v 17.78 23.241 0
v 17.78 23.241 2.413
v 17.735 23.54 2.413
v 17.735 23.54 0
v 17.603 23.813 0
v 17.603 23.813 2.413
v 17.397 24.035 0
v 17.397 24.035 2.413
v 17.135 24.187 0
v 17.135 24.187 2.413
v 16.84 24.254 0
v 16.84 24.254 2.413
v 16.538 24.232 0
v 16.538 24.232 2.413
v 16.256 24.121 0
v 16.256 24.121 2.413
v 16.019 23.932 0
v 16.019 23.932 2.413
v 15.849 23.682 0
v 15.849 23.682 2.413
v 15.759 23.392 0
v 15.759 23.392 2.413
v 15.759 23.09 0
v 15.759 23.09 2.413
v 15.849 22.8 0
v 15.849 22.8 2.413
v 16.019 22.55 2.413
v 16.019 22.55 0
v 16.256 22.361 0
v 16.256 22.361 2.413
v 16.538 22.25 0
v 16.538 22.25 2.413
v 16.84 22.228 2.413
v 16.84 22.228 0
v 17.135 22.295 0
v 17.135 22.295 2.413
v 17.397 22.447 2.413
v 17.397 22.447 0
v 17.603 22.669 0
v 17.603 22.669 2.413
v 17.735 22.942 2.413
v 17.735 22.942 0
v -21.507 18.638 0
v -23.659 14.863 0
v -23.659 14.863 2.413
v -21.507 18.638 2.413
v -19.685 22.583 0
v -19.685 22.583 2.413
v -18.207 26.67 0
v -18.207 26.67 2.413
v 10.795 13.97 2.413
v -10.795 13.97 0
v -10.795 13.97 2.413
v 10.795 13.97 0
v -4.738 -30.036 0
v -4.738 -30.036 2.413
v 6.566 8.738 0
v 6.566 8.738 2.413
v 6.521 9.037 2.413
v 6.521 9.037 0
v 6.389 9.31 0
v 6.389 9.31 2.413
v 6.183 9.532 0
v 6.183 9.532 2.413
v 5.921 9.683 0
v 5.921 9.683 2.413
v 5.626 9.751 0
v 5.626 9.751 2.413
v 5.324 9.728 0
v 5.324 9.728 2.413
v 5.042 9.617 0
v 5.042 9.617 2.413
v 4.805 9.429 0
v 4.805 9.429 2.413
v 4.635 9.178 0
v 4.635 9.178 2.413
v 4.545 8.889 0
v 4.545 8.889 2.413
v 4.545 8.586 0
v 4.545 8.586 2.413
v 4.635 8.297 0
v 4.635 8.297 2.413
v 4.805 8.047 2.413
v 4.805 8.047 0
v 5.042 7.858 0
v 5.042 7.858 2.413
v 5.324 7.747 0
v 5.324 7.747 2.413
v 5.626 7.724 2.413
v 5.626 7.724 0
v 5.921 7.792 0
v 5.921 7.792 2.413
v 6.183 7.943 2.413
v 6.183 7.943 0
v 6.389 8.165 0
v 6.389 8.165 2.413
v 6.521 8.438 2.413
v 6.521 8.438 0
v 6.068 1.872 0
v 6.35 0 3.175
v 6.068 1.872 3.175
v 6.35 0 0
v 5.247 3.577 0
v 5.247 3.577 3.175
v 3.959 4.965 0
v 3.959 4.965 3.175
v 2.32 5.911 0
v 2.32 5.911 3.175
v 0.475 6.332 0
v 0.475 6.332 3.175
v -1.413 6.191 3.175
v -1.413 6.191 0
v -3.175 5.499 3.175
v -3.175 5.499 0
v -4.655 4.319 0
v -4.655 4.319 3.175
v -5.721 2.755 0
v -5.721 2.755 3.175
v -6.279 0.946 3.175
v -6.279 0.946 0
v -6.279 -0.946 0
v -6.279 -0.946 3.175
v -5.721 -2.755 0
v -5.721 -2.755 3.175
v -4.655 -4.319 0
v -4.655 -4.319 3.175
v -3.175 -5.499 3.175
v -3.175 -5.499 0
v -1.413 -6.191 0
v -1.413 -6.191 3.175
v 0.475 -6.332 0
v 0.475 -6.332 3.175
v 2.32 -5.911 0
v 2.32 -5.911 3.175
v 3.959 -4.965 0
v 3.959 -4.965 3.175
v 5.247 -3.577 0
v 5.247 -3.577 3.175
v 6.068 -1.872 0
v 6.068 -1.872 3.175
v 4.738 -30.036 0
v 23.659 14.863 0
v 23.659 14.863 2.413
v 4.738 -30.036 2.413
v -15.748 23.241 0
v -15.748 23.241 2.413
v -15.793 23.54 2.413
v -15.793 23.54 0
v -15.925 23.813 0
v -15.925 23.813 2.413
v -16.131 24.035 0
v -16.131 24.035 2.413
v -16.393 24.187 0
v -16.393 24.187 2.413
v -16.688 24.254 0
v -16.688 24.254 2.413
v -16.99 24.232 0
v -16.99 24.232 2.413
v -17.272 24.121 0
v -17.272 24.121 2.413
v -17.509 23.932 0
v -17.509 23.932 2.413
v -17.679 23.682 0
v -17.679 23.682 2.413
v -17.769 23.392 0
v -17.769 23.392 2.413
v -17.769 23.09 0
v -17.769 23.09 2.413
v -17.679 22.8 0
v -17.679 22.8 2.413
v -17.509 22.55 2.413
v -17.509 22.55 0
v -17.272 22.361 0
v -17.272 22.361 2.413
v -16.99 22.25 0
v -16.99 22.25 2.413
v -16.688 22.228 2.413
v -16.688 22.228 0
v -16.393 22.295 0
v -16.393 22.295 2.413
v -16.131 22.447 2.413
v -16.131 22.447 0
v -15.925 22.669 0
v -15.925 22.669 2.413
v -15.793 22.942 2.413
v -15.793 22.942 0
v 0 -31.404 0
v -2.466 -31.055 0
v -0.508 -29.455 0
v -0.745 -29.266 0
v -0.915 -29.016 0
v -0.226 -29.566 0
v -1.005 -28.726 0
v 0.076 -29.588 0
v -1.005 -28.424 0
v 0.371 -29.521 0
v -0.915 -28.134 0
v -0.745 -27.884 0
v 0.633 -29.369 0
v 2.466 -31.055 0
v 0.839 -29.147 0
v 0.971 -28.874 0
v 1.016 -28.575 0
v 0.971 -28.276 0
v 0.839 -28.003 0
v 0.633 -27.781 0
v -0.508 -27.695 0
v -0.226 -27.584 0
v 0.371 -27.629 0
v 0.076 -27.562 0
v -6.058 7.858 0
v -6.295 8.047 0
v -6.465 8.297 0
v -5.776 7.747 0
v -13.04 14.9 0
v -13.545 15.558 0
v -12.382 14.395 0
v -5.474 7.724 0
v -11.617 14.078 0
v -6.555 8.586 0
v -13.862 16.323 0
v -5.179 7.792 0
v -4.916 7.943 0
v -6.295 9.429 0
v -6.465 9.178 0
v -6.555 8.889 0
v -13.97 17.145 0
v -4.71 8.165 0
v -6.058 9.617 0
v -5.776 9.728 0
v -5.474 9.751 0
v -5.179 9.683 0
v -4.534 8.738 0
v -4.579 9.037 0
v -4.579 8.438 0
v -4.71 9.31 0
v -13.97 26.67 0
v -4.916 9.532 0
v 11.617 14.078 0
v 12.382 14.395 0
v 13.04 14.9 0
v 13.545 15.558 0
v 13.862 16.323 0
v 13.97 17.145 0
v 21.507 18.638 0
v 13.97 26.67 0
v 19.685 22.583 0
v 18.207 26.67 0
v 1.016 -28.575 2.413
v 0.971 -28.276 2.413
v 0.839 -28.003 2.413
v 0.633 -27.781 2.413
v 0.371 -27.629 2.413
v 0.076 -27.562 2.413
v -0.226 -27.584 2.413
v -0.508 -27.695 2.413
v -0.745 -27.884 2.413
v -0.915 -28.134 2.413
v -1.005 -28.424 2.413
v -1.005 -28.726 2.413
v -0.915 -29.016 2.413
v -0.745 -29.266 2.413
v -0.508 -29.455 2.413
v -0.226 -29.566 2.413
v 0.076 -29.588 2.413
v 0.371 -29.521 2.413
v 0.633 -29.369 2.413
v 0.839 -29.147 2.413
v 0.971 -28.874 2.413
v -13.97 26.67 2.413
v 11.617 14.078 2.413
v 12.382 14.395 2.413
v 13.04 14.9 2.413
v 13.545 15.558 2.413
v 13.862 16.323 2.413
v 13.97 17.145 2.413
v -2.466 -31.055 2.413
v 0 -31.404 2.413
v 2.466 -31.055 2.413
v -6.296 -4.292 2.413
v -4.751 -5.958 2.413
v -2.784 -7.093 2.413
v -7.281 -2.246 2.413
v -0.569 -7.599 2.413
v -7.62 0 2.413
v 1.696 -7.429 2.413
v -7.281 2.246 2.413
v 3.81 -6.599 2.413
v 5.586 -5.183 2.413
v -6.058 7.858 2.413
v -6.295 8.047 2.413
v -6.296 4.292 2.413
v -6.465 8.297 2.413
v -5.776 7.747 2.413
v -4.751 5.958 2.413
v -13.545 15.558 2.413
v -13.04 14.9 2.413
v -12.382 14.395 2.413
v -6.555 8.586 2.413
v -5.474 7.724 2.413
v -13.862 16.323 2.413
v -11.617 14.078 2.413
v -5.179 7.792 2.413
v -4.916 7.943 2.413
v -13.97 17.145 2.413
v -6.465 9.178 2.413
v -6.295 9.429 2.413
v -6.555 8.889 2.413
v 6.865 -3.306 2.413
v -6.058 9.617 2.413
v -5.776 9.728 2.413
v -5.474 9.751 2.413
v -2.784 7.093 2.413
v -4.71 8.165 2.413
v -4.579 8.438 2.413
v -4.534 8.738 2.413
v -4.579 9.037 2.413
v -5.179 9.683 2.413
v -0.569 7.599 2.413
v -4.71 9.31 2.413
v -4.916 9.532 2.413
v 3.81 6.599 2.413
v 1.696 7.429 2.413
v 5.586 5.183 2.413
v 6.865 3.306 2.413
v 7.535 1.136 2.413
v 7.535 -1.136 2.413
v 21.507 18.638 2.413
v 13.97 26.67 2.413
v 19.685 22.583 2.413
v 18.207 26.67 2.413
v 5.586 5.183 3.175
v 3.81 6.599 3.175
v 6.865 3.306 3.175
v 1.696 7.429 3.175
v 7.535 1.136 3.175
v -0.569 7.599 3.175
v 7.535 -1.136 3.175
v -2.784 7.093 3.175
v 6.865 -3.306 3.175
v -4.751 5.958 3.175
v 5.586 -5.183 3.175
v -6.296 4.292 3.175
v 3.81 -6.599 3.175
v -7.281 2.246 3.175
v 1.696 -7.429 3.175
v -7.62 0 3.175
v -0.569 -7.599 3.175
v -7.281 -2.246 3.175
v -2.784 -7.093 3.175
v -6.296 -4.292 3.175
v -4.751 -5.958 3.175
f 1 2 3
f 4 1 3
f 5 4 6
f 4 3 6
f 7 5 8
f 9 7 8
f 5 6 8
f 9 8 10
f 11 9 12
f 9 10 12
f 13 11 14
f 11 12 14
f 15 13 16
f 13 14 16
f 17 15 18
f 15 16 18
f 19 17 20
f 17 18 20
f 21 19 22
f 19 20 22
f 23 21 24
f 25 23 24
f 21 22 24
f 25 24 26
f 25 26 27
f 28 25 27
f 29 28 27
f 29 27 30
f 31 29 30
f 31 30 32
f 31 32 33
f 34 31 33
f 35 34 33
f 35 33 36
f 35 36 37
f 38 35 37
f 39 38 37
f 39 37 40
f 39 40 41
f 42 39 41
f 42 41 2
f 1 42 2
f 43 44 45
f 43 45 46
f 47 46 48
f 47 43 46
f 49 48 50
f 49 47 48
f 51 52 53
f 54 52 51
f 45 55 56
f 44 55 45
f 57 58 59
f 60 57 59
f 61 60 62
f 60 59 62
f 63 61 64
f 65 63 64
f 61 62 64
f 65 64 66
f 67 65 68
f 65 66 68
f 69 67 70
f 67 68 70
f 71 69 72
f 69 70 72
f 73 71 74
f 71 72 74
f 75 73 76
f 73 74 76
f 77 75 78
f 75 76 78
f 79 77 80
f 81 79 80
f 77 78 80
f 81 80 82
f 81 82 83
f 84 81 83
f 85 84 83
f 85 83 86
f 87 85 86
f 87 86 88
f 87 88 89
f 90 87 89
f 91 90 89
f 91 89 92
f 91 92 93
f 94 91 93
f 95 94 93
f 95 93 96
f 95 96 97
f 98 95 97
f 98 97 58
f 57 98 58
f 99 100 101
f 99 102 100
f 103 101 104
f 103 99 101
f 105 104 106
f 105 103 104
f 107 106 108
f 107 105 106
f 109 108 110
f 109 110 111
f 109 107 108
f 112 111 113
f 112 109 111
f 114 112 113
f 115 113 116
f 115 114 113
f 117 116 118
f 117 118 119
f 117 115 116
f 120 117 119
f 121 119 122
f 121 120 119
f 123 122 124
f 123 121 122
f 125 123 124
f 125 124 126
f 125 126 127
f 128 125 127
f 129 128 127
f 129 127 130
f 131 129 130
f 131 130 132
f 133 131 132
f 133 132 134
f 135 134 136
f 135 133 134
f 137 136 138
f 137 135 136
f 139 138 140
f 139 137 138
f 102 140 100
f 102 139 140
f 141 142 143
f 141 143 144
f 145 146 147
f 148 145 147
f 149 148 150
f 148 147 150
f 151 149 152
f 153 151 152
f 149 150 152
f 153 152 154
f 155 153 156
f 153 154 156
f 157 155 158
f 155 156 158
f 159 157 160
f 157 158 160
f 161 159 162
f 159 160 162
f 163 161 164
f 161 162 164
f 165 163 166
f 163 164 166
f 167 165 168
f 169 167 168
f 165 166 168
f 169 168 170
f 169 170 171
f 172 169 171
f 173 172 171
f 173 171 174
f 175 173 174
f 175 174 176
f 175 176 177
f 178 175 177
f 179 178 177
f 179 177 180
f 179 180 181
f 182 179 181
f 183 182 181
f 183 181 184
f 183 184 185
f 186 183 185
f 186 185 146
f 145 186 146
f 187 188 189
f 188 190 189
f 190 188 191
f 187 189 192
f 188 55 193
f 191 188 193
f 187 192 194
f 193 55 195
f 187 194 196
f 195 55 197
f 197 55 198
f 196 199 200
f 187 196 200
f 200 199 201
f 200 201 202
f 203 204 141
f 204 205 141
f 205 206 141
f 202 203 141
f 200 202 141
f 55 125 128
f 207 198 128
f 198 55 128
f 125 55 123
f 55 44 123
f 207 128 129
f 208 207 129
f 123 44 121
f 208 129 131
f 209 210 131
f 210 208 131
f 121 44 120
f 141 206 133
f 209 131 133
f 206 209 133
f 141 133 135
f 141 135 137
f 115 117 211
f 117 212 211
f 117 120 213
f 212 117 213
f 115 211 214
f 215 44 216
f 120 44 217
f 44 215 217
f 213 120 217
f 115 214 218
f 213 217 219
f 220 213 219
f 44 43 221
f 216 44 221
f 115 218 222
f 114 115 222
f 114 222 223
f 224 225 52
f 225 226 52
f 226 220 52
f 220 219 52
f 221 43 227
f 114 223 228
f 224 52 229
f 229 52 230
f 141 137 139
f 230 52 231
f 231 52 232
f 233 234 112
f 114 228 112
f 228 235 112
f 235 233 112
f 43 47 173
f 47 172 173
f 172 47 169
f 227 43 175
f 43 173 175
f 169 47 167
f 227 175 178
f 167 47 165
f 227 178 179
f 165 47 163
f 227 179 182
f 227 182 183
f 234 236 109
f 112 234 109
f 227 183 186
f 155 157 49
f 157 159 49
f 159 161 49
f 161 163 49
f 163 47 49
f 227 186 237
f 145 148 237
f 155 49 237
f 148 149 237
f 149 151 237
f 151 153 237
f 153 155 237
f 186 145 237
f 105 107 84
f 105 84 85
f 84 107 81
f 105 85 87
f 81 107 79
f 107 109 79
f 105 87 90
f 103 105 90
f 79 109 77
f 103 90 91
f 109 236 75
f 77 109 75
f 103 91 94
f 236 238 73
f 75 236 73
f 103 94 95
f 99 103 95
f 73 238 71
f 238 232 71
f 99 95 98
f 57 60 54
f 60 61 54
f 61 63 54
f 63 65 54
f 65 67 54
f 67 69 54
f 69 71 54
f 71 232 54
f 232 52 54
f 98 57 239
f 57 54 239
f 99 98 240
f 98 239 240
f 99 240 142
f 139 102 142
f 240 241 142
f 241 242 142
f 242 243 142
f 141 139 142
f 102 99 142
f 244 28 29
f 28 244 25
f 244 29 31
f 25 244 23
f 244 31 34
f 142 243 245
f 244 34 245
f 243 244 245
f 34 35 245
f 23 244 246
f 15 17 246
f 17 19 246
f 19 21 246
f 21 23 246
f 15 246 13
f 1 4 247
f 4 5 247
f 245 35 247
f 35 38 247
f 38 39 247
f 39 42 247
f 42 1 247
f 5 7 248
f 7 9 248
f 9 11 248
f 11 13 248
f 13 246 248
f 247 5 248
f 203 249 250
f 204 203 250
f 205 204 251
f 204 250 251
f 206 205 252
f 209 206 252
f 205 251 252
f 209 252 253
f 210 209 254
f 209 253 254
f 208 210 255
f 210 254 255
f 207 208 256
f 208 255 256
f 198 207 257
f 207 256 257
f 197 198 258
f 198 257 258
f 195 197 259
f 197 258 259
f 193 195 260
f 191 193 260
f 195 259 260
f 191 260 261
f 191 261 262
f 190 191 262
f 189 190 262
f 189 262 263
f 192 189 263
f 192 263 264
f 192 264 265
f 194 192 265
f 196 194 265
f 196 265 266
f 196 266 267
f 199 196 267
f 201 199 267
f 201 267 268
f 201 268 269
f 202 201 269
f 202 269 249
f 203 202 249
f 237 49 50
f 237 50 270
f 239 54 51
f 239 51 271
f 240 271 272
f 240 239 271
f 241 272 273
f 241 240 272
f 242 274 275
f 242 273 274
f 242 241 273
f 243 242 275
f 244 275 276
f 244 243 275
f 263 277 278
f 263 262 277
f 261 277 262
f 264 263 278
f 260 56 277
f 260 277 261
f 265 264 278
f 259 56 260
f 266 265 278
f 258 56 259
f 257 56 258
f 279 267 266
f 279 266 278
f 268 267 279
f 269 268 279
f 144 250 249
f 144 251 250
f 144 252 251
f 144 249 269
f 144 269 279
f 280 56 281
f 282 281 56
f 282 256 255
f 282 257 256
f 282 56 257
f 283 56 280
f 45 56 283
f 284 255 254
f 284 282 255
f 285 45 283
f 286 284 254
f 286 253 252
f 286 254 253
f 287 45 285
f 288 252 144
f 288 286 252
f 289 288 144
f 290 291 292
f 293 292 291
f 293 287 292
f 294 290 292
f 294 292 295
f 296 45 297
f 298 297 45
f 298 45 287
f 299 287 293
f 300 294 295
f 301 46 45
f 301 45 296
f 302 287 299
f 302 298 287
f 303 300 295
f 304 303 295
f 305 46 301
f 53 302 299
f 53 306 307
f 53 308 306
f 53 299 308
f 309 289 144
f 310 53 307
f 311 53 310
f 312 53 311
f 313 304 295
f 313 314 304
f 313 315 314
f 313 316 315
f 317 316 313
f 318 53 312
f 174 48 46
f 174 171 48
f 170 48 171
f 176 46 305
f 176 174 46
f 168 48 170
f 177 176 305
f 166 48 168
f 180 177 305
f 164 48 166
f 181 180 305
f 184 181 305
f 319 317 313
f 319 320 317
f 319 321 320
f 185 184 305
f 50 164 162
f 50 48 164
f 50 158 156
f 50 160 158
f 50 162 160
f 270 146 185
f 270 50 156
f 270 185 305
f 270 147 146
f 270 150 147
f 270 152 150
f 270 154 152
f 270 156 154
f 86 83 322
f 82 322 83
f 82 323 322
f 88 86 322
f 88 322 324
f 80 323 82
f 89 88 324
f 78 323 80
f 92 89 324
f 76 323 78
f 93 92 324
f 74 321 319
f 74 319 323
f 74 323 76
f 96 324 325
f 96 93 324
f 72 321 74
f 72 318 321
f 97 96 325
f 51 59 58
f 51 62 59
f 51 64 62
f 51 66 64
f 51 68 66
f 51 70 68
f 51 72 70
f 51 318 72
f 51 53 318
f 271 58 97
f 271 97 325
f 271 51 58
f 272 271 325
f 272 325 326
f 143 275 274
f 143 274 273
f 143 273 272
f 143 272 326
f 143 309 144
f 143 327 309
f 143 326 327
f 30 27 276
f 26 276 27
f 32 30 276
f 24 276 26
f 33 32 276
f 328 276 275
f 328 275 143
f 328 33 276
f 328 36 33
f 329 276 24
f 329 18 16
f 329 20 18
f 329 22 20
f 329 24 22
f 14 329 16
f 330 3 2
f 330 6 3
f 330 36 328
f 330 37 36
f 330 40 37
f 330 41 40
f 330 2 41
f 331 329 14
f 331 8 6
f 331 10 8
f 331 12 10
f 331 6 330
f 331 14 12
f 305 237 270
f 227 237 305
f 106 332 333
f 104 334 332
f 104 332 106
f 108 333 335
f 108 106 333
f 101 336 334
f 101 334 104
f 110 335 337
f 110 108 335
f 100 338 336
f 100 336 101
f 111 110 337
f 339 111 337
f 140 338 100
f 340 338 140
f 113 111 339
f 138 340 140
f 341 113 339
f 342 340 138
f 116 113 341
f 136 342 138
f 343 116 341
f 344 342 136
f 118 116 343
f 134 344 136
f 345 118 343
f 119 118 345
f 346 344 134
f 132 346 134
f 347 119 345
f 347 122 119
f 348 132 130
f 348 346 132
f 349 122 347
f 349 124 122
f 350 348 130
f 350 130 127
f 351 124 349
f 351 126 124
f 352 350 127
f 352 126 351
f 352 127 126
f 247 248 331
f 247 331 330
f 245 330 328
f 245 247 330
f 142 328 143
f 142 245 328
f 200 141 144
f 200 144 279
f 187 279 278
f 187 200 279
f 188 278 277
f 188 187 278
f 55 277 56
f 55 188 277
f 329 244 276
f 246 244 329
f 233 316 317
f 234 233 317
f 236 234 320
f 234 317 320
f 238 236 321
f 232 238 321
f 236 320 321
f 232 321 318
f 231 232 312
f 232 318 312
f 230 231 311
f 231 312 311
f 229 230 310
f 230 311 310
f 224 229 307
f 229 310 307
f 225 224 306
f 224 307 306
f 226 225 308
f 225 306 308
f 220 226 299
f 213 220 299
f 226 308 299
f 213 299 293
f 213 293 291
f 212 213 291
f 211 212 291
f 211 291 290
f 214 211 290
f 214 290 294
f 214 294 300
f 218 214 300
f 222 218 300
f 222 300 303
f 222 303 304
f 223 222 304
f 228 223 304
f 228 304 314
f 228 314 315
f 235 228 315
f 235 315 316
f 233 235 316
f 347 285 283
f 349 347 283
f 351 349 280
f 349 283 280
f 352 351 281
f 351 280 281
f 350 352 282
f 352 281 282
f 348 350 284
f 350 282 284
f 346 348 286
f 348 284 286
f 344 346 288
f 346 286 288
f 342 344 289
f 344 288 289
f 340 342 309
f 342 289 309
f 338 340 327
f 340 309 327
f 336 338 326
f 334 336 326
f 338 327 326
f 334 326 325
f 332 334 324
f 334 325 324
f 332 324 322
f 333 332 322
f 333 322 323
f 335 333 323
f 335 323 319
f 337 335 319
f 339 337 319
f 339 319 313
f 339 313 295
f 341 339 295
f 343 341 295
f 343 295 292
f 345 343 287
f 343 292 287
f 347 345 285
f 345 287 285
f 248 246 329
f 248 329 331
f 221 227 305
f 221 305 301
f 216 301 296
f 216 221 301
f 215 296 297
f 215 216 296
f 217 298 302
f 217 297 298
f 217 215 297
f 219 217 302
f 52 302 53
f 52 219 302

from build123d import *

# Parameters (mm, degrees)
SKETCH1_R           = 76.2
SKETCH1_R_2         = 6.35
BOSS_EXTRUDE1_DEPTH = 2.413
SKETCH2_R           = 7.62
SKETCH2_R_2         = 6.35
BOSS_EXTRUDE3_DEPTH = 0.762
SKETCH4_R           = 76.257533764
CUT_EXTRUDE1_DEPTH  = 93.98
SKETCH5_R           = 1.016
CUT_EXTRUDE2_DEPTH  = 93.98


with BuildPart() as part:
    # Sketch1 → Boss-Extrude1 (new body)
    with BuildSketch(Plane.XY):
        Circle(SKETCH1_R)
        Circle(SKETCH1_R_2, mode=Mode.SUBTRACT)
    extrude(amount=BOSS_EXTRUDE1_DEPTH)

    # Sketch2 → Boss-Extrude3 (add)
    with BuildSketch(Plane.XY.offset(2.413)):
        with Locations(Location((0, 0, 0), (0, 0, 180))):
            Circle(SKETCH2_R)
        Circle(SKETCH2_R_2, mode=Mode.SUBTRACT)
    extrude(amount=BOSS_EXTRUDE3_DEPTH)

    # Sketch4 → Cut-Extrude1 (cut)
    with BuildSketch(Plane(origin=(0, 0, 0), x_dir=(-1, 0, 0), z_dir=(0, 0, -1))):
        Circle(SKETCH4_R)
        with BuildLine():
            Line((10.795, 13.97), (-10.795, 13.97))
            ThreePointArc((-10.795, 13.97), (-13.04006403, 14.89993597), (-13.97, 17.145))
            Line((-13.97, 17.145), (-13.97, 26.67))
            Line((-13.97, 26.67), (-18.20732863, 26.67))
            ThreePointArc((-18.20732863, 26.67), (-20.55370118, 20.591203739), (-23.658870968, 14.862752926))
            Line((-23.658870968, 14.862752926), (-4.737825132, -30.035944056))
            ThreePointArc((-4.737825132, -30.035944056), (0, -31.403636364), (4.737825132, -30.035944056))
            Line((4.737825132, -30.035944056), (23.658870968, 14.862752926))
            ThreePointArc((23.658870968, 14.862752926), (20.55370118, 20.591203739), (18.20732863, 26.67))
            Line((18.20732863, 26.67), (13.97, 26.67))
            Line((13.97, 26.67), (13.97, 17.145))
            ThreePointArc((13.97, 17.145), (13.04006403, 14.89993597), (10.795, 13.97))
        make_face(mode=Mode.SUBTRACT)
    extrude(amount=-CUT_EXTRUDE1_DEPTH, mode=Mode.SUBTRACT)

    # Sketch5 → Cut-Extrude2 (cut)
    with BuildSketch(Plane.XY.offset(2.413)):
        with Locations((-16.764, 23.241)):
            Circle(SKETCH5_R)
        with Locations((16.764, 23.241)):
            Circle(SKETCH5_R)
        with Locations((0, -28.575)):
            Circle(SKETCH5_R)
        with Locations((-5.5499, 8.7376)):
            Circle(SKETCH5_R)
        with Locations((5.5499, 8.7376)):
            Circle(SKETCH5_R)
    extrude(amount=-CUT_EXTRUDE2_DEPTH, mode=Mode.SUBTRACT)


solid = part.part
